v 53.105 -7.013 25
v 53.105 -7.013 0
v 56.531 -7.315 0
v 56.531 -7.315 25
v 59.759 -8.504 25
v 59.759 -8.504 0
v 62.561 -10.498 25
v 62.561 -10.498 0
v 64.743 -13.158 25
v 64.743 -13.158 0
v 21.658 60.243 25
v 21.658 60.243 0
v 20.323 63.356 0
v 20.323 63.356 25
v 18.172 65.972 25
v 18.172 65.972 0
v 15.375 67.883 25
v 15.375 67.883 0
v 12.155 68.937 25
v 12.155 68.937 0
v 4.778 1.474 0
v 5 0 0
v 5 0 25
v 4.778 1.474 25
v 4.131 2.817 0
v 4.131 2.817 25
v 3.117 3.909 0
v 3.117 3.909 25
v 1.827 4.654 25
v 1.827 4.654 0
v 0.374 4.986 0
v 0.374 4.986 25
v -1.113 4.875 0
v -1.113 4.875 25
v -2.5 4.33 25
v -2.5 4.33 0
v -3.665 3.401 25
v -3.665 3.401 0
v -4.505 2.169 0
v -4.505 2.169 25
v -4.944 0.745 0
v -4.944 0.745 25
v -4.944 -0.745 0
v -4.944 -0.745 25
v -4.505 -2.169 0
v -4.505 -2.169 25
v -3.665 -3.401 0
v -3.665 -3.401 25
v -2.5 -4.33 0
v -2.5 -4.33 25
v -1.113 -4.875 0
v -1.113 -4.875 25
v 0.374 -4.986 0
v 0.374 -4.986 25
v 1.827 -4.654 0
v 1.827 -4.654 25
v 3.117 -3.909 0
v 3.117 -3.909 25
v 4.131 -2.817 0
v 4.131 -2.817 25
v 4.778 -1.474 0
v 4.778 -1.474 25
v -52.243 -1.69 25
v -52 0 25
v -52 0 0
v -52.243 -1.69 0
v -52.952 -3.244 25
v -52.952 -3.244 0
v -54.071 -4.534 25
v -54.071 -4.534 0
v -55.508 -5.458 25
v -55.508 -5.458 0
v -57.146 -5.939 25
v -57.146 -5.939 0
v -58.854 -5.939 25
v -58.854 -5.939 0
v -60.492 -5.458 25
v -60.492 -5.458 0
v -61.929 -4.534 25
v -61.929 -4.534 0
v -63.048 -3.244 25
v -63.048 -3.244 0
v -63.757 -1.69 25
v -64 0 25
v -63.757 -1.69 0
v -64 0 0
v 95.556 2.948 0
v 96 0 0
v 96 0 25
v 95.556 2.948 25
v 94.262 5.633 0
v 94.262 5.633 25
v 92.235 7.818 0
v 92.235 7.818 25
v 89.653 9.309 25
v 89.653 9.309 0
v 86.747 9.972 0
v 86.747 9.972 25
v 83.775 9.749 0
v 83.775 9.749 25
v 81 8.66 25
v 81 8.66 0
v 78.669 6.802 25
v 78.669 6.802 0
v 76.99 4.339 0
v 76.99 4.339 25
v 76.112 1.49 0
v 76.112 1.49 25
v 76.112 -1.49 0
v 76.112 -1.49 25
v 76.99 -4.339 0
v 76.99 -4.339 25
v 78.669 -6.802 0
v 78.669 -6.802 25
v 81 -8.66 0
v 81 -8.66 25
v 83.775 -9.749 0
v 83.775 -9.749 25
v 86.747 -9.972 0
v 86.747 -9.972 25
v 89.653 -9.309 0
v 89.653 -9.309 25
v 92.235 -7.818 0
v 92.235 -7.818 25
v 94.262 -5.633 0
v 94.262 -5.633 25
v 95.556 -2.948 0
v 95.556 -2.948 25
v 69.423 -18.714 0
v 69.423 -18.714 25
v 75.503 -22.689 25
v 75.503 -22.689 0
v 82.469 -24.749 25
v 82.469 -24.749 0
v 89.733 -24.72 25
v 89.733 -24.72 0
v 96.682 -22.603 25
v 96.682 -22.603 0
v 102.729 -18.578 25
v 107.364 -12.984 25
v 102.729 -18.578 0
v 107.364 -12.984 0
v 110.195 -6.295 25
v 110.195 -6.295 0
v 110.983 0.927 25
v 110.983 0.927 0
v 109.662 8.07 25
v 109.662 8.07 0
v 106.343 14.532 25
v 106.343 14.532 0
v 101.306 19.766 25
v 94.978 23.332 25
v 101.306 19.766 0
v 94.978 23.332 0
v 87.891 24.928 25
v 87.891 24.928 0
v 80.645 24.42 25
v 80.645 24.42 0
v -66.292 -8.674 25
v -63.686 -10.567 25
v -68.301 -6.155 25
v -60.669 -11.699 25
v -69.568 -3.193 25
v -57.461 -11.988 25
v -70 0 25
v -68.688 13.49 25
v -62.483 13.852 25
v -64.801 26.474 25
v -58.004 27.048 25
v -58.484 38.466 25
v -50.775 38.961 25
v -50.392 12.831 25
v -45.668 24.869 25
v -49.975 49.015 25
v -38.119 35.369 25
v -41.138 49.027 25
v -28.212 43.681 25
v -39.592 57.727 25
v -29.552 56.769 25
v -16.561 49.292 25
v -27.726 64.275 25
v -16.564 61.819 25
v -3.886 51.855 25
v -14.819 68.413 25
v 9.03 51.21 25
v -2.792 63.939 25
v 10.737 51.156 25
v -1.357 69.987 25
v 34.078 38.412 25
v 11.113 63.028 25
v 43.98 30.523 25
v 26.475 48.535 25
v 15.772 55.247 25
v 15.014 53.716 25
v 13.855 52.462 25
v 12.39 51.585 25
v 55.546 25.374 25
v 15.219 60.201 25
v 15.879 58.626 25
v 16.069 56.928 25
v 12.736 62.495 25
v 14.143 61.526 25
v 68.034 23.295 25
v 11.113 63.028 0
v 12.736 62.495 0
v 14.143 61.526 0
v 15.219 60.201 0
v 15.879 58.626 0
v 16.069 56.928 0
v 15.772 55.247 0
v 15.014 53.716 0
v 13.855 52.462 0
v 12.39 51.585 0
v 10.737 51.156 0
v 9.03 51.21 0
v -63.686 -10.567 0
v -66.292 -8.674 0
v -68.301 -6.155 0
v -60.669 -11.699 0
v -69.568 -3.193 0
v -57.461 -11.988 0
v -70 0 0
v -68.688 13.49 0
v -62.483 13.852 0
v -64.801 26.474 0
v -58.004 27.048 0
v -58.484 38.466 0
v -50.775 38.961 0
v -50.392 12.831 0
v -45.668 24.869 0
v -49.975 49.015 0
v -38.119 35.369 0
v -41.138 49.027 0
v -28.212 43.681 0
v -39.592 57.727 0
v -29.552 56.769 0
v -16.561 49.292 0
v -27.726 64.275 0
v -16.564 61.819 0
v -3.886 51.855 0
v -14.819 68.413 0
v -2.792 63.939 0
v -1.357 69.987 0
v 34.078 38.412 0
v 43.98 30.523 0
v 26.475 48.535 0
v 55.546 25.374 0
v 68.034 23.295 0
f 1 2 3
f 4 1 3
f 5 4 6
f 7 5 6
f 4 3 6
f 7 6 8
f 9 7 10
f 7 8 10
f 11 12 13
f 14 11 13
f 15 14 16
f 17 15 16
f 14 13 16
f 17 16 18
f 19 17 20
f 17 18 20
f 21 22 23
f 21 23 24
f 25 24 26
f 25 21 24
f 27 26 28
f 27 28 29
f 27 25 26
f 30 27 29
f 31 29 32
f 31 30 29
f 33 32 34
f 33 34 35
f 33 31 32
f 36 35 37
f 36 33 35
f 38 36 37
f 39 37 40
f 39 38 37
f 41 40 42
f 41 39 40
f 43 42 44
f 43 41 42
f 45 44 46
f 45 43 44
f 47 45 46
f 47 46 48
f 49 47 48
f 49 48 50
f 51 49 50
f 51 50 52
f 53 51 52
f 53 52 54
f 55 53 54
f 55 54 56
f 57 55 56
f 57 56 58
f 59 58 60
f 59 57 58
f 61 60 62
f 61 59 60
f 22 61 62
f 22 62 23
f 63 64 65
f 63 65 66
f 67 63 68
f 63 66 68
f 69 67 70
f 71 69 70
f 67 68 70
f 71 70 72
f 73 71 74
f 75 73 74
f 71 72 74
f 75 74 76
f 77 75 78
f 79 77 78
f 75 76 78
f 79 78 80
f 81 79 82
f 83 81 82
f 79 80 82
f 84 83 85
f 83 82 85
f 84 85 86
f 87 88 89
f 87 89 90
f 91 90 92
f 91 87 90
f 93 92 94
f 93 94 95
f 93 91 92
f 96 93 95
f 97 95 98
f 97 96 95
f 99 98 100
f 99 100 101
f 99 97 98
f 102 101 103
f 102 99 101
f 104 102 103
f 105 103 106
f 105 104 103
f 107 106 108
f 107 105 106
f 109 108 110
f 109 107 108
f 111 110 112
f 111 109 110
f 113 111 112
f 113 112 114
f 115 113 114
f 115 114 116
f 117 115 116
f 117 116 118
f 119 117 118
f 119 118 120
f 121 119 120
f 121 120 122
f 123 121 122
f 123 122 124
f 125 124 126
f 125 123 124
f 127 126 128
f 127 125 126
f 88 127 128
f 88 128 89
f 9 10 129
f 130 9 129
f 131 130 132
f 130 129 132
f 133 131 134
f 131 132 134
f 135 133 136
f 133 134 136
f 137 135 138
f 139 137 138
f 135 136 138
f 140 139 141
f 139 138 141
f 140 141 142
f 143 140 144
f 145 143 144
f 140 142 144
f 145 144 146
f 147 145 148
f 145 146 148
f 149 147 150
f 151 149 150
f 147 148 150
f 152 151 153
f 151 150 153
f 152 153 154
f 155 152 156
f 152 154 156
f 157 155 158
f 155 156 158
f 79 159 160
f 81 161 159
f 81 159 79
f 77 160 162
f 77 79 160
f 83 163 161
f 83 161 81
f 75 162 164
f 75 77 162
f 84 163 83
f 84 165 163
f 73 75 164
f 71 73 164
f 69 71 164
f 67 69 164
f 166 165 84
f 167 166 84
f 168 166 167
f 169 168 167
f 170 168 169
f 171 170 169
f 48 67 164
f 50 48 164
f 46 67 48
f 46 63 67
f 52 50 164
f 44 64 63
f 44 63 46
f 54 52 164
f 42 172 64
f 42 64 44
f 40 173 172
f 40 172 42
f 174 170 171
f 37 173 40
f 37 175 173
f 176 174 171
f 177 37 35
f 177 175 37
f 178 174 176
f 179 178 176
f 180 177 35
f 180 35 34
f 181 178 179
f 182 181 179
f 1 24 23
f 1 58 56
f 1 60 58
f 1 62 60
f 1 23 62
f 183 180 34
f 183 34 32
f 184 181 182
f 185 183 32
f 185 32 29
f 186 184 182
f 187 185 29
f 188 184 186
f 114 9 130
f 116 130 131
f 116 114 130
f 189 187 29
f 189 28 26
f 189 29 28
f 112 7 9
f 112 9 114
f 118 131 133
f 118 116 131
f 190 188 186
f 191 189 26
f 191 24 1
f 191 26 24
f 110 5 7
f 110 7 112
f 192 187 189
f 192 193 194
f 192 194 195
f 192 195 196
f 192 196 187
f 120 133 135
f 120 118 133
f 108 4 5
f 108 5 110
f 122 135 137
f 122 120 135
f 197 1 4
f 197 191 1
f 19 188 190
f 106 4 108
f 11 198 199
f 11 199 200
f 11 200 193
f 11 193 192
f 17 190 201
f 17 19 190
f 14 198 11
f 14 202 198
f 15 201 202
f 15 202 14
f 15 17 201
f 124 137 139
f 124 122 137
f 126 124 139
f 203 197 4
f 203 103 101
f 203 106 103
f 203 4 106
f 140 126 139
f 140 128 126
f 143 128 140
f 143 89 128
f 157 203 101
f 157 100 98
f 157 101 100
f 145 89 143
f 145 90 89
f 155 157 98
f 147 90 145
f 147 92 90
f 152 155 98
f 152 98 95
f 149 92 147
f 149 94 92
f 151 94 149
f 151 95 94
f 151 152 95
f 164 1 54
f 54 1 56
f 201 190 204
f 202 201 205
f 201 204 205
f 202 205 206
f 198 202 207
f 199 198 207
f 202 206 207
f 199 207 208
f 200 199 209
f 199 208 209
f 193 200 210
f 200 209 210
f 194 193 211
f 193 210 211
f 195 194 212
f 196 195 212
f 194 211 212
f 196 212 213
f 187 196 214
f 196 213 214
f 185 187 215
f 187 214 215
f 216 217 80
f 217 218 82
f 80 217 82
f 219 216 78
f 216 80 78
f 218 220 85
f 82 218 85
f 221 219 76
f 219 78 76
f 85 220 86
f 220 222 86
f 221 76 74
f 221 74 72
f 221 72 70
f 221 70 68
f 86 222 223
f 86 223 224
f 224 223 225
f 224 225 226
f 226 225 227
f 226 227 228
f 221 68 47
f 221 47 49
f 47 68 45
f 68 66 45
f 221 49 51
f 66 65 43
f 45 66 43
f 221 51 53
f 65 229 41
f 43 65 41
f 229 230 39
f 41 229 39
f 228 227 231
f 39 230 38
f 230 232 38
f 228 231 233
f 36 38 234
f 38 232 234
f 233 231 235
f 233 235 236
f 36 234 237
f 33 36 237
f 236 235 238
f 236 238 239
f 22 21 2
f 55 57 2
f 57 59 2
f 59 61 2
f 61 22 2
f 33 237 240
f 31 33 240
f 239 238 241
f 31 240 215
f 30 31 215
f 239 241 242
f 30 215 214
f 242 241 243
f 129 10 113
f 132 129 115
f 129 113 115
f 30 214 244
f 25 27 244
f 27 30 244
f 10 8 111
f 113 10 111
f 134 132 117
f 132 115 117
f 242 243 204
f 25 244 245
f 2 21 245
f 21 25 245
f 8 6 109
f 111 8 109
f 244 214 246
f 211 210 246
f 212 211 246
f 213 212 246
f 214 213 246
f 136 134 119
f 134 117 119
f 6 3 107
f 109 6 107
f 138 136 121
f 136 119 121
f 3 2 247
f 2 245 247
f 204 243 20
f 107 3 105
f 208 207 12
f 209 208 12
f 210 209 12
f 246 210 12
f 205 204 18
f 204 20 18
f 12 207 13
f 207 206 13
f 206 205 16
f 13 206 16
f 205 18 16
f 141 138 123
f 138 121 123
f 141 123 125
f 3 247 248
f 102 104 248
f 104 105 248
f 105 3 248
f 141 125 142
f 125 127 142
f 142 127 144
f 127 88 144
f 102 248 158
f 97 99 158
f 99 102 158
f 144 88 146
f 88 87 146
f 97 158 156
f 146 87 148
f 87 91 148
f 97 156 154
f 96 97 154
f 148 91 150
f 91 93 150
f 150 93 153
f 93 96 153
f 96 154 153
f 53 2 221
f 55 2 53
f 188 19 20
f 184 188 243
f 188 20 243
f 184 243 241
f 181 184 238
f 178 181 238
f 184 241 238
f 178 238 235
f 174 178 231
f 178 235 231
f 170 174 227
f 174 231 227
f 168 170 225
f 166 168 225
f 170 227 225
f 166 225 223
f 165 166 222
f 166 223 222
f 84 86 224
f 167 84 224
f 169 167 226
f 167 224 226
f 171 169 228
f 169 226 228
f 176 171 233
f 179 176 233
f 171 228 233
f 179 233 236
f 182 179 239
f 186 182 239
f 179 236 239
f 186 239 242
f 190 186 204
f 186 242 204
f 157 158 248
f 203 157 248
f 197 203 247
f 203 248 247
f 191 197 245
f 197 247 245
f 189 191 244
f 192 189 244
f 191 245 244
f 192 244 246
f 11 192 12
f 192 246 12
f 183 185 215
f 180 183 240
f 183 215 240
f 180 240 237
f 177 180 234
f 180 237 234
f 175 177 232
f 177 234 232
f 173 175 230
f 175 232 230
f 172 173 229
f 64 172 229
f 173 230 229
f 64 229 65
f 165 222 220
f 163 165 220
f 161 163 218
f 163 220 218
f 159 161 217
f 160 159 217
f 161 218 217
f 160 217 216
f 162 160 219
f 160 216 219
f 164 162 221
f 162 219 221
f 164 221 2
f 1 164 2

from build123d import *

# Parameters (mm, degrees)
F0_R     = 5
F0_R_2   = 10
F1_DEPTH = 25


with BuildPart() as f1:
    # F0 (on Top) → F1 (new body)
    with BuildSketch(Plane.XY):
        with BuildLine():
            ThreePointArc((53.104685, -7.013139), (59.758753, -8.503991), (64.74277, -13.157895))
            ThreePointArc((64.74277, -13.157895), (109.023376, -9.742904), (80.644633, 24.419665))
            ThreePointArc((80.644633, 24.419665), (43.979871, 30.522731), (21.657847, 60.242749))
            ThreePointArc((21.657847, 60.242749), (18.171776, 65.972496), (12.155372, 68.936543))
            ThreePointArc((12.155372, 68.936543), (-44.995133, 53.623111), (-70, 0))
            ThreePointArc((-70, 0), (-66.29239, -8.673884), (-57.460622, -11.987872))
            Line((-57.460622, -11.987872), (53.104685, -7.013139))
        make_face()
        Circle(F0_R, mode=Mode.SUBTRACT)
        with Locations((86, 0)):
            Circle(F0_R_2, mode=Mode.SUBTRACT)
        with BuildLine():
            ThreePointArc((-64, 0), (-41.138407, 49.026844), (11.113483, 63.027696))
            ThreePointArc((11.113483, 63.027696), (15.980441, 56.076961), (9.029705, 51.210003))
            ThreePointArc((9.029705, 51.210003), (-33.424956, 39.834311), (-52, 0))
            ThreePointArc((-52, 0), (-58, -6), (-64, 0))
        make_face(mode=Mode.SUBTRACT)
    extrude(amount=F1_DEPTH)


solid = f1.part
